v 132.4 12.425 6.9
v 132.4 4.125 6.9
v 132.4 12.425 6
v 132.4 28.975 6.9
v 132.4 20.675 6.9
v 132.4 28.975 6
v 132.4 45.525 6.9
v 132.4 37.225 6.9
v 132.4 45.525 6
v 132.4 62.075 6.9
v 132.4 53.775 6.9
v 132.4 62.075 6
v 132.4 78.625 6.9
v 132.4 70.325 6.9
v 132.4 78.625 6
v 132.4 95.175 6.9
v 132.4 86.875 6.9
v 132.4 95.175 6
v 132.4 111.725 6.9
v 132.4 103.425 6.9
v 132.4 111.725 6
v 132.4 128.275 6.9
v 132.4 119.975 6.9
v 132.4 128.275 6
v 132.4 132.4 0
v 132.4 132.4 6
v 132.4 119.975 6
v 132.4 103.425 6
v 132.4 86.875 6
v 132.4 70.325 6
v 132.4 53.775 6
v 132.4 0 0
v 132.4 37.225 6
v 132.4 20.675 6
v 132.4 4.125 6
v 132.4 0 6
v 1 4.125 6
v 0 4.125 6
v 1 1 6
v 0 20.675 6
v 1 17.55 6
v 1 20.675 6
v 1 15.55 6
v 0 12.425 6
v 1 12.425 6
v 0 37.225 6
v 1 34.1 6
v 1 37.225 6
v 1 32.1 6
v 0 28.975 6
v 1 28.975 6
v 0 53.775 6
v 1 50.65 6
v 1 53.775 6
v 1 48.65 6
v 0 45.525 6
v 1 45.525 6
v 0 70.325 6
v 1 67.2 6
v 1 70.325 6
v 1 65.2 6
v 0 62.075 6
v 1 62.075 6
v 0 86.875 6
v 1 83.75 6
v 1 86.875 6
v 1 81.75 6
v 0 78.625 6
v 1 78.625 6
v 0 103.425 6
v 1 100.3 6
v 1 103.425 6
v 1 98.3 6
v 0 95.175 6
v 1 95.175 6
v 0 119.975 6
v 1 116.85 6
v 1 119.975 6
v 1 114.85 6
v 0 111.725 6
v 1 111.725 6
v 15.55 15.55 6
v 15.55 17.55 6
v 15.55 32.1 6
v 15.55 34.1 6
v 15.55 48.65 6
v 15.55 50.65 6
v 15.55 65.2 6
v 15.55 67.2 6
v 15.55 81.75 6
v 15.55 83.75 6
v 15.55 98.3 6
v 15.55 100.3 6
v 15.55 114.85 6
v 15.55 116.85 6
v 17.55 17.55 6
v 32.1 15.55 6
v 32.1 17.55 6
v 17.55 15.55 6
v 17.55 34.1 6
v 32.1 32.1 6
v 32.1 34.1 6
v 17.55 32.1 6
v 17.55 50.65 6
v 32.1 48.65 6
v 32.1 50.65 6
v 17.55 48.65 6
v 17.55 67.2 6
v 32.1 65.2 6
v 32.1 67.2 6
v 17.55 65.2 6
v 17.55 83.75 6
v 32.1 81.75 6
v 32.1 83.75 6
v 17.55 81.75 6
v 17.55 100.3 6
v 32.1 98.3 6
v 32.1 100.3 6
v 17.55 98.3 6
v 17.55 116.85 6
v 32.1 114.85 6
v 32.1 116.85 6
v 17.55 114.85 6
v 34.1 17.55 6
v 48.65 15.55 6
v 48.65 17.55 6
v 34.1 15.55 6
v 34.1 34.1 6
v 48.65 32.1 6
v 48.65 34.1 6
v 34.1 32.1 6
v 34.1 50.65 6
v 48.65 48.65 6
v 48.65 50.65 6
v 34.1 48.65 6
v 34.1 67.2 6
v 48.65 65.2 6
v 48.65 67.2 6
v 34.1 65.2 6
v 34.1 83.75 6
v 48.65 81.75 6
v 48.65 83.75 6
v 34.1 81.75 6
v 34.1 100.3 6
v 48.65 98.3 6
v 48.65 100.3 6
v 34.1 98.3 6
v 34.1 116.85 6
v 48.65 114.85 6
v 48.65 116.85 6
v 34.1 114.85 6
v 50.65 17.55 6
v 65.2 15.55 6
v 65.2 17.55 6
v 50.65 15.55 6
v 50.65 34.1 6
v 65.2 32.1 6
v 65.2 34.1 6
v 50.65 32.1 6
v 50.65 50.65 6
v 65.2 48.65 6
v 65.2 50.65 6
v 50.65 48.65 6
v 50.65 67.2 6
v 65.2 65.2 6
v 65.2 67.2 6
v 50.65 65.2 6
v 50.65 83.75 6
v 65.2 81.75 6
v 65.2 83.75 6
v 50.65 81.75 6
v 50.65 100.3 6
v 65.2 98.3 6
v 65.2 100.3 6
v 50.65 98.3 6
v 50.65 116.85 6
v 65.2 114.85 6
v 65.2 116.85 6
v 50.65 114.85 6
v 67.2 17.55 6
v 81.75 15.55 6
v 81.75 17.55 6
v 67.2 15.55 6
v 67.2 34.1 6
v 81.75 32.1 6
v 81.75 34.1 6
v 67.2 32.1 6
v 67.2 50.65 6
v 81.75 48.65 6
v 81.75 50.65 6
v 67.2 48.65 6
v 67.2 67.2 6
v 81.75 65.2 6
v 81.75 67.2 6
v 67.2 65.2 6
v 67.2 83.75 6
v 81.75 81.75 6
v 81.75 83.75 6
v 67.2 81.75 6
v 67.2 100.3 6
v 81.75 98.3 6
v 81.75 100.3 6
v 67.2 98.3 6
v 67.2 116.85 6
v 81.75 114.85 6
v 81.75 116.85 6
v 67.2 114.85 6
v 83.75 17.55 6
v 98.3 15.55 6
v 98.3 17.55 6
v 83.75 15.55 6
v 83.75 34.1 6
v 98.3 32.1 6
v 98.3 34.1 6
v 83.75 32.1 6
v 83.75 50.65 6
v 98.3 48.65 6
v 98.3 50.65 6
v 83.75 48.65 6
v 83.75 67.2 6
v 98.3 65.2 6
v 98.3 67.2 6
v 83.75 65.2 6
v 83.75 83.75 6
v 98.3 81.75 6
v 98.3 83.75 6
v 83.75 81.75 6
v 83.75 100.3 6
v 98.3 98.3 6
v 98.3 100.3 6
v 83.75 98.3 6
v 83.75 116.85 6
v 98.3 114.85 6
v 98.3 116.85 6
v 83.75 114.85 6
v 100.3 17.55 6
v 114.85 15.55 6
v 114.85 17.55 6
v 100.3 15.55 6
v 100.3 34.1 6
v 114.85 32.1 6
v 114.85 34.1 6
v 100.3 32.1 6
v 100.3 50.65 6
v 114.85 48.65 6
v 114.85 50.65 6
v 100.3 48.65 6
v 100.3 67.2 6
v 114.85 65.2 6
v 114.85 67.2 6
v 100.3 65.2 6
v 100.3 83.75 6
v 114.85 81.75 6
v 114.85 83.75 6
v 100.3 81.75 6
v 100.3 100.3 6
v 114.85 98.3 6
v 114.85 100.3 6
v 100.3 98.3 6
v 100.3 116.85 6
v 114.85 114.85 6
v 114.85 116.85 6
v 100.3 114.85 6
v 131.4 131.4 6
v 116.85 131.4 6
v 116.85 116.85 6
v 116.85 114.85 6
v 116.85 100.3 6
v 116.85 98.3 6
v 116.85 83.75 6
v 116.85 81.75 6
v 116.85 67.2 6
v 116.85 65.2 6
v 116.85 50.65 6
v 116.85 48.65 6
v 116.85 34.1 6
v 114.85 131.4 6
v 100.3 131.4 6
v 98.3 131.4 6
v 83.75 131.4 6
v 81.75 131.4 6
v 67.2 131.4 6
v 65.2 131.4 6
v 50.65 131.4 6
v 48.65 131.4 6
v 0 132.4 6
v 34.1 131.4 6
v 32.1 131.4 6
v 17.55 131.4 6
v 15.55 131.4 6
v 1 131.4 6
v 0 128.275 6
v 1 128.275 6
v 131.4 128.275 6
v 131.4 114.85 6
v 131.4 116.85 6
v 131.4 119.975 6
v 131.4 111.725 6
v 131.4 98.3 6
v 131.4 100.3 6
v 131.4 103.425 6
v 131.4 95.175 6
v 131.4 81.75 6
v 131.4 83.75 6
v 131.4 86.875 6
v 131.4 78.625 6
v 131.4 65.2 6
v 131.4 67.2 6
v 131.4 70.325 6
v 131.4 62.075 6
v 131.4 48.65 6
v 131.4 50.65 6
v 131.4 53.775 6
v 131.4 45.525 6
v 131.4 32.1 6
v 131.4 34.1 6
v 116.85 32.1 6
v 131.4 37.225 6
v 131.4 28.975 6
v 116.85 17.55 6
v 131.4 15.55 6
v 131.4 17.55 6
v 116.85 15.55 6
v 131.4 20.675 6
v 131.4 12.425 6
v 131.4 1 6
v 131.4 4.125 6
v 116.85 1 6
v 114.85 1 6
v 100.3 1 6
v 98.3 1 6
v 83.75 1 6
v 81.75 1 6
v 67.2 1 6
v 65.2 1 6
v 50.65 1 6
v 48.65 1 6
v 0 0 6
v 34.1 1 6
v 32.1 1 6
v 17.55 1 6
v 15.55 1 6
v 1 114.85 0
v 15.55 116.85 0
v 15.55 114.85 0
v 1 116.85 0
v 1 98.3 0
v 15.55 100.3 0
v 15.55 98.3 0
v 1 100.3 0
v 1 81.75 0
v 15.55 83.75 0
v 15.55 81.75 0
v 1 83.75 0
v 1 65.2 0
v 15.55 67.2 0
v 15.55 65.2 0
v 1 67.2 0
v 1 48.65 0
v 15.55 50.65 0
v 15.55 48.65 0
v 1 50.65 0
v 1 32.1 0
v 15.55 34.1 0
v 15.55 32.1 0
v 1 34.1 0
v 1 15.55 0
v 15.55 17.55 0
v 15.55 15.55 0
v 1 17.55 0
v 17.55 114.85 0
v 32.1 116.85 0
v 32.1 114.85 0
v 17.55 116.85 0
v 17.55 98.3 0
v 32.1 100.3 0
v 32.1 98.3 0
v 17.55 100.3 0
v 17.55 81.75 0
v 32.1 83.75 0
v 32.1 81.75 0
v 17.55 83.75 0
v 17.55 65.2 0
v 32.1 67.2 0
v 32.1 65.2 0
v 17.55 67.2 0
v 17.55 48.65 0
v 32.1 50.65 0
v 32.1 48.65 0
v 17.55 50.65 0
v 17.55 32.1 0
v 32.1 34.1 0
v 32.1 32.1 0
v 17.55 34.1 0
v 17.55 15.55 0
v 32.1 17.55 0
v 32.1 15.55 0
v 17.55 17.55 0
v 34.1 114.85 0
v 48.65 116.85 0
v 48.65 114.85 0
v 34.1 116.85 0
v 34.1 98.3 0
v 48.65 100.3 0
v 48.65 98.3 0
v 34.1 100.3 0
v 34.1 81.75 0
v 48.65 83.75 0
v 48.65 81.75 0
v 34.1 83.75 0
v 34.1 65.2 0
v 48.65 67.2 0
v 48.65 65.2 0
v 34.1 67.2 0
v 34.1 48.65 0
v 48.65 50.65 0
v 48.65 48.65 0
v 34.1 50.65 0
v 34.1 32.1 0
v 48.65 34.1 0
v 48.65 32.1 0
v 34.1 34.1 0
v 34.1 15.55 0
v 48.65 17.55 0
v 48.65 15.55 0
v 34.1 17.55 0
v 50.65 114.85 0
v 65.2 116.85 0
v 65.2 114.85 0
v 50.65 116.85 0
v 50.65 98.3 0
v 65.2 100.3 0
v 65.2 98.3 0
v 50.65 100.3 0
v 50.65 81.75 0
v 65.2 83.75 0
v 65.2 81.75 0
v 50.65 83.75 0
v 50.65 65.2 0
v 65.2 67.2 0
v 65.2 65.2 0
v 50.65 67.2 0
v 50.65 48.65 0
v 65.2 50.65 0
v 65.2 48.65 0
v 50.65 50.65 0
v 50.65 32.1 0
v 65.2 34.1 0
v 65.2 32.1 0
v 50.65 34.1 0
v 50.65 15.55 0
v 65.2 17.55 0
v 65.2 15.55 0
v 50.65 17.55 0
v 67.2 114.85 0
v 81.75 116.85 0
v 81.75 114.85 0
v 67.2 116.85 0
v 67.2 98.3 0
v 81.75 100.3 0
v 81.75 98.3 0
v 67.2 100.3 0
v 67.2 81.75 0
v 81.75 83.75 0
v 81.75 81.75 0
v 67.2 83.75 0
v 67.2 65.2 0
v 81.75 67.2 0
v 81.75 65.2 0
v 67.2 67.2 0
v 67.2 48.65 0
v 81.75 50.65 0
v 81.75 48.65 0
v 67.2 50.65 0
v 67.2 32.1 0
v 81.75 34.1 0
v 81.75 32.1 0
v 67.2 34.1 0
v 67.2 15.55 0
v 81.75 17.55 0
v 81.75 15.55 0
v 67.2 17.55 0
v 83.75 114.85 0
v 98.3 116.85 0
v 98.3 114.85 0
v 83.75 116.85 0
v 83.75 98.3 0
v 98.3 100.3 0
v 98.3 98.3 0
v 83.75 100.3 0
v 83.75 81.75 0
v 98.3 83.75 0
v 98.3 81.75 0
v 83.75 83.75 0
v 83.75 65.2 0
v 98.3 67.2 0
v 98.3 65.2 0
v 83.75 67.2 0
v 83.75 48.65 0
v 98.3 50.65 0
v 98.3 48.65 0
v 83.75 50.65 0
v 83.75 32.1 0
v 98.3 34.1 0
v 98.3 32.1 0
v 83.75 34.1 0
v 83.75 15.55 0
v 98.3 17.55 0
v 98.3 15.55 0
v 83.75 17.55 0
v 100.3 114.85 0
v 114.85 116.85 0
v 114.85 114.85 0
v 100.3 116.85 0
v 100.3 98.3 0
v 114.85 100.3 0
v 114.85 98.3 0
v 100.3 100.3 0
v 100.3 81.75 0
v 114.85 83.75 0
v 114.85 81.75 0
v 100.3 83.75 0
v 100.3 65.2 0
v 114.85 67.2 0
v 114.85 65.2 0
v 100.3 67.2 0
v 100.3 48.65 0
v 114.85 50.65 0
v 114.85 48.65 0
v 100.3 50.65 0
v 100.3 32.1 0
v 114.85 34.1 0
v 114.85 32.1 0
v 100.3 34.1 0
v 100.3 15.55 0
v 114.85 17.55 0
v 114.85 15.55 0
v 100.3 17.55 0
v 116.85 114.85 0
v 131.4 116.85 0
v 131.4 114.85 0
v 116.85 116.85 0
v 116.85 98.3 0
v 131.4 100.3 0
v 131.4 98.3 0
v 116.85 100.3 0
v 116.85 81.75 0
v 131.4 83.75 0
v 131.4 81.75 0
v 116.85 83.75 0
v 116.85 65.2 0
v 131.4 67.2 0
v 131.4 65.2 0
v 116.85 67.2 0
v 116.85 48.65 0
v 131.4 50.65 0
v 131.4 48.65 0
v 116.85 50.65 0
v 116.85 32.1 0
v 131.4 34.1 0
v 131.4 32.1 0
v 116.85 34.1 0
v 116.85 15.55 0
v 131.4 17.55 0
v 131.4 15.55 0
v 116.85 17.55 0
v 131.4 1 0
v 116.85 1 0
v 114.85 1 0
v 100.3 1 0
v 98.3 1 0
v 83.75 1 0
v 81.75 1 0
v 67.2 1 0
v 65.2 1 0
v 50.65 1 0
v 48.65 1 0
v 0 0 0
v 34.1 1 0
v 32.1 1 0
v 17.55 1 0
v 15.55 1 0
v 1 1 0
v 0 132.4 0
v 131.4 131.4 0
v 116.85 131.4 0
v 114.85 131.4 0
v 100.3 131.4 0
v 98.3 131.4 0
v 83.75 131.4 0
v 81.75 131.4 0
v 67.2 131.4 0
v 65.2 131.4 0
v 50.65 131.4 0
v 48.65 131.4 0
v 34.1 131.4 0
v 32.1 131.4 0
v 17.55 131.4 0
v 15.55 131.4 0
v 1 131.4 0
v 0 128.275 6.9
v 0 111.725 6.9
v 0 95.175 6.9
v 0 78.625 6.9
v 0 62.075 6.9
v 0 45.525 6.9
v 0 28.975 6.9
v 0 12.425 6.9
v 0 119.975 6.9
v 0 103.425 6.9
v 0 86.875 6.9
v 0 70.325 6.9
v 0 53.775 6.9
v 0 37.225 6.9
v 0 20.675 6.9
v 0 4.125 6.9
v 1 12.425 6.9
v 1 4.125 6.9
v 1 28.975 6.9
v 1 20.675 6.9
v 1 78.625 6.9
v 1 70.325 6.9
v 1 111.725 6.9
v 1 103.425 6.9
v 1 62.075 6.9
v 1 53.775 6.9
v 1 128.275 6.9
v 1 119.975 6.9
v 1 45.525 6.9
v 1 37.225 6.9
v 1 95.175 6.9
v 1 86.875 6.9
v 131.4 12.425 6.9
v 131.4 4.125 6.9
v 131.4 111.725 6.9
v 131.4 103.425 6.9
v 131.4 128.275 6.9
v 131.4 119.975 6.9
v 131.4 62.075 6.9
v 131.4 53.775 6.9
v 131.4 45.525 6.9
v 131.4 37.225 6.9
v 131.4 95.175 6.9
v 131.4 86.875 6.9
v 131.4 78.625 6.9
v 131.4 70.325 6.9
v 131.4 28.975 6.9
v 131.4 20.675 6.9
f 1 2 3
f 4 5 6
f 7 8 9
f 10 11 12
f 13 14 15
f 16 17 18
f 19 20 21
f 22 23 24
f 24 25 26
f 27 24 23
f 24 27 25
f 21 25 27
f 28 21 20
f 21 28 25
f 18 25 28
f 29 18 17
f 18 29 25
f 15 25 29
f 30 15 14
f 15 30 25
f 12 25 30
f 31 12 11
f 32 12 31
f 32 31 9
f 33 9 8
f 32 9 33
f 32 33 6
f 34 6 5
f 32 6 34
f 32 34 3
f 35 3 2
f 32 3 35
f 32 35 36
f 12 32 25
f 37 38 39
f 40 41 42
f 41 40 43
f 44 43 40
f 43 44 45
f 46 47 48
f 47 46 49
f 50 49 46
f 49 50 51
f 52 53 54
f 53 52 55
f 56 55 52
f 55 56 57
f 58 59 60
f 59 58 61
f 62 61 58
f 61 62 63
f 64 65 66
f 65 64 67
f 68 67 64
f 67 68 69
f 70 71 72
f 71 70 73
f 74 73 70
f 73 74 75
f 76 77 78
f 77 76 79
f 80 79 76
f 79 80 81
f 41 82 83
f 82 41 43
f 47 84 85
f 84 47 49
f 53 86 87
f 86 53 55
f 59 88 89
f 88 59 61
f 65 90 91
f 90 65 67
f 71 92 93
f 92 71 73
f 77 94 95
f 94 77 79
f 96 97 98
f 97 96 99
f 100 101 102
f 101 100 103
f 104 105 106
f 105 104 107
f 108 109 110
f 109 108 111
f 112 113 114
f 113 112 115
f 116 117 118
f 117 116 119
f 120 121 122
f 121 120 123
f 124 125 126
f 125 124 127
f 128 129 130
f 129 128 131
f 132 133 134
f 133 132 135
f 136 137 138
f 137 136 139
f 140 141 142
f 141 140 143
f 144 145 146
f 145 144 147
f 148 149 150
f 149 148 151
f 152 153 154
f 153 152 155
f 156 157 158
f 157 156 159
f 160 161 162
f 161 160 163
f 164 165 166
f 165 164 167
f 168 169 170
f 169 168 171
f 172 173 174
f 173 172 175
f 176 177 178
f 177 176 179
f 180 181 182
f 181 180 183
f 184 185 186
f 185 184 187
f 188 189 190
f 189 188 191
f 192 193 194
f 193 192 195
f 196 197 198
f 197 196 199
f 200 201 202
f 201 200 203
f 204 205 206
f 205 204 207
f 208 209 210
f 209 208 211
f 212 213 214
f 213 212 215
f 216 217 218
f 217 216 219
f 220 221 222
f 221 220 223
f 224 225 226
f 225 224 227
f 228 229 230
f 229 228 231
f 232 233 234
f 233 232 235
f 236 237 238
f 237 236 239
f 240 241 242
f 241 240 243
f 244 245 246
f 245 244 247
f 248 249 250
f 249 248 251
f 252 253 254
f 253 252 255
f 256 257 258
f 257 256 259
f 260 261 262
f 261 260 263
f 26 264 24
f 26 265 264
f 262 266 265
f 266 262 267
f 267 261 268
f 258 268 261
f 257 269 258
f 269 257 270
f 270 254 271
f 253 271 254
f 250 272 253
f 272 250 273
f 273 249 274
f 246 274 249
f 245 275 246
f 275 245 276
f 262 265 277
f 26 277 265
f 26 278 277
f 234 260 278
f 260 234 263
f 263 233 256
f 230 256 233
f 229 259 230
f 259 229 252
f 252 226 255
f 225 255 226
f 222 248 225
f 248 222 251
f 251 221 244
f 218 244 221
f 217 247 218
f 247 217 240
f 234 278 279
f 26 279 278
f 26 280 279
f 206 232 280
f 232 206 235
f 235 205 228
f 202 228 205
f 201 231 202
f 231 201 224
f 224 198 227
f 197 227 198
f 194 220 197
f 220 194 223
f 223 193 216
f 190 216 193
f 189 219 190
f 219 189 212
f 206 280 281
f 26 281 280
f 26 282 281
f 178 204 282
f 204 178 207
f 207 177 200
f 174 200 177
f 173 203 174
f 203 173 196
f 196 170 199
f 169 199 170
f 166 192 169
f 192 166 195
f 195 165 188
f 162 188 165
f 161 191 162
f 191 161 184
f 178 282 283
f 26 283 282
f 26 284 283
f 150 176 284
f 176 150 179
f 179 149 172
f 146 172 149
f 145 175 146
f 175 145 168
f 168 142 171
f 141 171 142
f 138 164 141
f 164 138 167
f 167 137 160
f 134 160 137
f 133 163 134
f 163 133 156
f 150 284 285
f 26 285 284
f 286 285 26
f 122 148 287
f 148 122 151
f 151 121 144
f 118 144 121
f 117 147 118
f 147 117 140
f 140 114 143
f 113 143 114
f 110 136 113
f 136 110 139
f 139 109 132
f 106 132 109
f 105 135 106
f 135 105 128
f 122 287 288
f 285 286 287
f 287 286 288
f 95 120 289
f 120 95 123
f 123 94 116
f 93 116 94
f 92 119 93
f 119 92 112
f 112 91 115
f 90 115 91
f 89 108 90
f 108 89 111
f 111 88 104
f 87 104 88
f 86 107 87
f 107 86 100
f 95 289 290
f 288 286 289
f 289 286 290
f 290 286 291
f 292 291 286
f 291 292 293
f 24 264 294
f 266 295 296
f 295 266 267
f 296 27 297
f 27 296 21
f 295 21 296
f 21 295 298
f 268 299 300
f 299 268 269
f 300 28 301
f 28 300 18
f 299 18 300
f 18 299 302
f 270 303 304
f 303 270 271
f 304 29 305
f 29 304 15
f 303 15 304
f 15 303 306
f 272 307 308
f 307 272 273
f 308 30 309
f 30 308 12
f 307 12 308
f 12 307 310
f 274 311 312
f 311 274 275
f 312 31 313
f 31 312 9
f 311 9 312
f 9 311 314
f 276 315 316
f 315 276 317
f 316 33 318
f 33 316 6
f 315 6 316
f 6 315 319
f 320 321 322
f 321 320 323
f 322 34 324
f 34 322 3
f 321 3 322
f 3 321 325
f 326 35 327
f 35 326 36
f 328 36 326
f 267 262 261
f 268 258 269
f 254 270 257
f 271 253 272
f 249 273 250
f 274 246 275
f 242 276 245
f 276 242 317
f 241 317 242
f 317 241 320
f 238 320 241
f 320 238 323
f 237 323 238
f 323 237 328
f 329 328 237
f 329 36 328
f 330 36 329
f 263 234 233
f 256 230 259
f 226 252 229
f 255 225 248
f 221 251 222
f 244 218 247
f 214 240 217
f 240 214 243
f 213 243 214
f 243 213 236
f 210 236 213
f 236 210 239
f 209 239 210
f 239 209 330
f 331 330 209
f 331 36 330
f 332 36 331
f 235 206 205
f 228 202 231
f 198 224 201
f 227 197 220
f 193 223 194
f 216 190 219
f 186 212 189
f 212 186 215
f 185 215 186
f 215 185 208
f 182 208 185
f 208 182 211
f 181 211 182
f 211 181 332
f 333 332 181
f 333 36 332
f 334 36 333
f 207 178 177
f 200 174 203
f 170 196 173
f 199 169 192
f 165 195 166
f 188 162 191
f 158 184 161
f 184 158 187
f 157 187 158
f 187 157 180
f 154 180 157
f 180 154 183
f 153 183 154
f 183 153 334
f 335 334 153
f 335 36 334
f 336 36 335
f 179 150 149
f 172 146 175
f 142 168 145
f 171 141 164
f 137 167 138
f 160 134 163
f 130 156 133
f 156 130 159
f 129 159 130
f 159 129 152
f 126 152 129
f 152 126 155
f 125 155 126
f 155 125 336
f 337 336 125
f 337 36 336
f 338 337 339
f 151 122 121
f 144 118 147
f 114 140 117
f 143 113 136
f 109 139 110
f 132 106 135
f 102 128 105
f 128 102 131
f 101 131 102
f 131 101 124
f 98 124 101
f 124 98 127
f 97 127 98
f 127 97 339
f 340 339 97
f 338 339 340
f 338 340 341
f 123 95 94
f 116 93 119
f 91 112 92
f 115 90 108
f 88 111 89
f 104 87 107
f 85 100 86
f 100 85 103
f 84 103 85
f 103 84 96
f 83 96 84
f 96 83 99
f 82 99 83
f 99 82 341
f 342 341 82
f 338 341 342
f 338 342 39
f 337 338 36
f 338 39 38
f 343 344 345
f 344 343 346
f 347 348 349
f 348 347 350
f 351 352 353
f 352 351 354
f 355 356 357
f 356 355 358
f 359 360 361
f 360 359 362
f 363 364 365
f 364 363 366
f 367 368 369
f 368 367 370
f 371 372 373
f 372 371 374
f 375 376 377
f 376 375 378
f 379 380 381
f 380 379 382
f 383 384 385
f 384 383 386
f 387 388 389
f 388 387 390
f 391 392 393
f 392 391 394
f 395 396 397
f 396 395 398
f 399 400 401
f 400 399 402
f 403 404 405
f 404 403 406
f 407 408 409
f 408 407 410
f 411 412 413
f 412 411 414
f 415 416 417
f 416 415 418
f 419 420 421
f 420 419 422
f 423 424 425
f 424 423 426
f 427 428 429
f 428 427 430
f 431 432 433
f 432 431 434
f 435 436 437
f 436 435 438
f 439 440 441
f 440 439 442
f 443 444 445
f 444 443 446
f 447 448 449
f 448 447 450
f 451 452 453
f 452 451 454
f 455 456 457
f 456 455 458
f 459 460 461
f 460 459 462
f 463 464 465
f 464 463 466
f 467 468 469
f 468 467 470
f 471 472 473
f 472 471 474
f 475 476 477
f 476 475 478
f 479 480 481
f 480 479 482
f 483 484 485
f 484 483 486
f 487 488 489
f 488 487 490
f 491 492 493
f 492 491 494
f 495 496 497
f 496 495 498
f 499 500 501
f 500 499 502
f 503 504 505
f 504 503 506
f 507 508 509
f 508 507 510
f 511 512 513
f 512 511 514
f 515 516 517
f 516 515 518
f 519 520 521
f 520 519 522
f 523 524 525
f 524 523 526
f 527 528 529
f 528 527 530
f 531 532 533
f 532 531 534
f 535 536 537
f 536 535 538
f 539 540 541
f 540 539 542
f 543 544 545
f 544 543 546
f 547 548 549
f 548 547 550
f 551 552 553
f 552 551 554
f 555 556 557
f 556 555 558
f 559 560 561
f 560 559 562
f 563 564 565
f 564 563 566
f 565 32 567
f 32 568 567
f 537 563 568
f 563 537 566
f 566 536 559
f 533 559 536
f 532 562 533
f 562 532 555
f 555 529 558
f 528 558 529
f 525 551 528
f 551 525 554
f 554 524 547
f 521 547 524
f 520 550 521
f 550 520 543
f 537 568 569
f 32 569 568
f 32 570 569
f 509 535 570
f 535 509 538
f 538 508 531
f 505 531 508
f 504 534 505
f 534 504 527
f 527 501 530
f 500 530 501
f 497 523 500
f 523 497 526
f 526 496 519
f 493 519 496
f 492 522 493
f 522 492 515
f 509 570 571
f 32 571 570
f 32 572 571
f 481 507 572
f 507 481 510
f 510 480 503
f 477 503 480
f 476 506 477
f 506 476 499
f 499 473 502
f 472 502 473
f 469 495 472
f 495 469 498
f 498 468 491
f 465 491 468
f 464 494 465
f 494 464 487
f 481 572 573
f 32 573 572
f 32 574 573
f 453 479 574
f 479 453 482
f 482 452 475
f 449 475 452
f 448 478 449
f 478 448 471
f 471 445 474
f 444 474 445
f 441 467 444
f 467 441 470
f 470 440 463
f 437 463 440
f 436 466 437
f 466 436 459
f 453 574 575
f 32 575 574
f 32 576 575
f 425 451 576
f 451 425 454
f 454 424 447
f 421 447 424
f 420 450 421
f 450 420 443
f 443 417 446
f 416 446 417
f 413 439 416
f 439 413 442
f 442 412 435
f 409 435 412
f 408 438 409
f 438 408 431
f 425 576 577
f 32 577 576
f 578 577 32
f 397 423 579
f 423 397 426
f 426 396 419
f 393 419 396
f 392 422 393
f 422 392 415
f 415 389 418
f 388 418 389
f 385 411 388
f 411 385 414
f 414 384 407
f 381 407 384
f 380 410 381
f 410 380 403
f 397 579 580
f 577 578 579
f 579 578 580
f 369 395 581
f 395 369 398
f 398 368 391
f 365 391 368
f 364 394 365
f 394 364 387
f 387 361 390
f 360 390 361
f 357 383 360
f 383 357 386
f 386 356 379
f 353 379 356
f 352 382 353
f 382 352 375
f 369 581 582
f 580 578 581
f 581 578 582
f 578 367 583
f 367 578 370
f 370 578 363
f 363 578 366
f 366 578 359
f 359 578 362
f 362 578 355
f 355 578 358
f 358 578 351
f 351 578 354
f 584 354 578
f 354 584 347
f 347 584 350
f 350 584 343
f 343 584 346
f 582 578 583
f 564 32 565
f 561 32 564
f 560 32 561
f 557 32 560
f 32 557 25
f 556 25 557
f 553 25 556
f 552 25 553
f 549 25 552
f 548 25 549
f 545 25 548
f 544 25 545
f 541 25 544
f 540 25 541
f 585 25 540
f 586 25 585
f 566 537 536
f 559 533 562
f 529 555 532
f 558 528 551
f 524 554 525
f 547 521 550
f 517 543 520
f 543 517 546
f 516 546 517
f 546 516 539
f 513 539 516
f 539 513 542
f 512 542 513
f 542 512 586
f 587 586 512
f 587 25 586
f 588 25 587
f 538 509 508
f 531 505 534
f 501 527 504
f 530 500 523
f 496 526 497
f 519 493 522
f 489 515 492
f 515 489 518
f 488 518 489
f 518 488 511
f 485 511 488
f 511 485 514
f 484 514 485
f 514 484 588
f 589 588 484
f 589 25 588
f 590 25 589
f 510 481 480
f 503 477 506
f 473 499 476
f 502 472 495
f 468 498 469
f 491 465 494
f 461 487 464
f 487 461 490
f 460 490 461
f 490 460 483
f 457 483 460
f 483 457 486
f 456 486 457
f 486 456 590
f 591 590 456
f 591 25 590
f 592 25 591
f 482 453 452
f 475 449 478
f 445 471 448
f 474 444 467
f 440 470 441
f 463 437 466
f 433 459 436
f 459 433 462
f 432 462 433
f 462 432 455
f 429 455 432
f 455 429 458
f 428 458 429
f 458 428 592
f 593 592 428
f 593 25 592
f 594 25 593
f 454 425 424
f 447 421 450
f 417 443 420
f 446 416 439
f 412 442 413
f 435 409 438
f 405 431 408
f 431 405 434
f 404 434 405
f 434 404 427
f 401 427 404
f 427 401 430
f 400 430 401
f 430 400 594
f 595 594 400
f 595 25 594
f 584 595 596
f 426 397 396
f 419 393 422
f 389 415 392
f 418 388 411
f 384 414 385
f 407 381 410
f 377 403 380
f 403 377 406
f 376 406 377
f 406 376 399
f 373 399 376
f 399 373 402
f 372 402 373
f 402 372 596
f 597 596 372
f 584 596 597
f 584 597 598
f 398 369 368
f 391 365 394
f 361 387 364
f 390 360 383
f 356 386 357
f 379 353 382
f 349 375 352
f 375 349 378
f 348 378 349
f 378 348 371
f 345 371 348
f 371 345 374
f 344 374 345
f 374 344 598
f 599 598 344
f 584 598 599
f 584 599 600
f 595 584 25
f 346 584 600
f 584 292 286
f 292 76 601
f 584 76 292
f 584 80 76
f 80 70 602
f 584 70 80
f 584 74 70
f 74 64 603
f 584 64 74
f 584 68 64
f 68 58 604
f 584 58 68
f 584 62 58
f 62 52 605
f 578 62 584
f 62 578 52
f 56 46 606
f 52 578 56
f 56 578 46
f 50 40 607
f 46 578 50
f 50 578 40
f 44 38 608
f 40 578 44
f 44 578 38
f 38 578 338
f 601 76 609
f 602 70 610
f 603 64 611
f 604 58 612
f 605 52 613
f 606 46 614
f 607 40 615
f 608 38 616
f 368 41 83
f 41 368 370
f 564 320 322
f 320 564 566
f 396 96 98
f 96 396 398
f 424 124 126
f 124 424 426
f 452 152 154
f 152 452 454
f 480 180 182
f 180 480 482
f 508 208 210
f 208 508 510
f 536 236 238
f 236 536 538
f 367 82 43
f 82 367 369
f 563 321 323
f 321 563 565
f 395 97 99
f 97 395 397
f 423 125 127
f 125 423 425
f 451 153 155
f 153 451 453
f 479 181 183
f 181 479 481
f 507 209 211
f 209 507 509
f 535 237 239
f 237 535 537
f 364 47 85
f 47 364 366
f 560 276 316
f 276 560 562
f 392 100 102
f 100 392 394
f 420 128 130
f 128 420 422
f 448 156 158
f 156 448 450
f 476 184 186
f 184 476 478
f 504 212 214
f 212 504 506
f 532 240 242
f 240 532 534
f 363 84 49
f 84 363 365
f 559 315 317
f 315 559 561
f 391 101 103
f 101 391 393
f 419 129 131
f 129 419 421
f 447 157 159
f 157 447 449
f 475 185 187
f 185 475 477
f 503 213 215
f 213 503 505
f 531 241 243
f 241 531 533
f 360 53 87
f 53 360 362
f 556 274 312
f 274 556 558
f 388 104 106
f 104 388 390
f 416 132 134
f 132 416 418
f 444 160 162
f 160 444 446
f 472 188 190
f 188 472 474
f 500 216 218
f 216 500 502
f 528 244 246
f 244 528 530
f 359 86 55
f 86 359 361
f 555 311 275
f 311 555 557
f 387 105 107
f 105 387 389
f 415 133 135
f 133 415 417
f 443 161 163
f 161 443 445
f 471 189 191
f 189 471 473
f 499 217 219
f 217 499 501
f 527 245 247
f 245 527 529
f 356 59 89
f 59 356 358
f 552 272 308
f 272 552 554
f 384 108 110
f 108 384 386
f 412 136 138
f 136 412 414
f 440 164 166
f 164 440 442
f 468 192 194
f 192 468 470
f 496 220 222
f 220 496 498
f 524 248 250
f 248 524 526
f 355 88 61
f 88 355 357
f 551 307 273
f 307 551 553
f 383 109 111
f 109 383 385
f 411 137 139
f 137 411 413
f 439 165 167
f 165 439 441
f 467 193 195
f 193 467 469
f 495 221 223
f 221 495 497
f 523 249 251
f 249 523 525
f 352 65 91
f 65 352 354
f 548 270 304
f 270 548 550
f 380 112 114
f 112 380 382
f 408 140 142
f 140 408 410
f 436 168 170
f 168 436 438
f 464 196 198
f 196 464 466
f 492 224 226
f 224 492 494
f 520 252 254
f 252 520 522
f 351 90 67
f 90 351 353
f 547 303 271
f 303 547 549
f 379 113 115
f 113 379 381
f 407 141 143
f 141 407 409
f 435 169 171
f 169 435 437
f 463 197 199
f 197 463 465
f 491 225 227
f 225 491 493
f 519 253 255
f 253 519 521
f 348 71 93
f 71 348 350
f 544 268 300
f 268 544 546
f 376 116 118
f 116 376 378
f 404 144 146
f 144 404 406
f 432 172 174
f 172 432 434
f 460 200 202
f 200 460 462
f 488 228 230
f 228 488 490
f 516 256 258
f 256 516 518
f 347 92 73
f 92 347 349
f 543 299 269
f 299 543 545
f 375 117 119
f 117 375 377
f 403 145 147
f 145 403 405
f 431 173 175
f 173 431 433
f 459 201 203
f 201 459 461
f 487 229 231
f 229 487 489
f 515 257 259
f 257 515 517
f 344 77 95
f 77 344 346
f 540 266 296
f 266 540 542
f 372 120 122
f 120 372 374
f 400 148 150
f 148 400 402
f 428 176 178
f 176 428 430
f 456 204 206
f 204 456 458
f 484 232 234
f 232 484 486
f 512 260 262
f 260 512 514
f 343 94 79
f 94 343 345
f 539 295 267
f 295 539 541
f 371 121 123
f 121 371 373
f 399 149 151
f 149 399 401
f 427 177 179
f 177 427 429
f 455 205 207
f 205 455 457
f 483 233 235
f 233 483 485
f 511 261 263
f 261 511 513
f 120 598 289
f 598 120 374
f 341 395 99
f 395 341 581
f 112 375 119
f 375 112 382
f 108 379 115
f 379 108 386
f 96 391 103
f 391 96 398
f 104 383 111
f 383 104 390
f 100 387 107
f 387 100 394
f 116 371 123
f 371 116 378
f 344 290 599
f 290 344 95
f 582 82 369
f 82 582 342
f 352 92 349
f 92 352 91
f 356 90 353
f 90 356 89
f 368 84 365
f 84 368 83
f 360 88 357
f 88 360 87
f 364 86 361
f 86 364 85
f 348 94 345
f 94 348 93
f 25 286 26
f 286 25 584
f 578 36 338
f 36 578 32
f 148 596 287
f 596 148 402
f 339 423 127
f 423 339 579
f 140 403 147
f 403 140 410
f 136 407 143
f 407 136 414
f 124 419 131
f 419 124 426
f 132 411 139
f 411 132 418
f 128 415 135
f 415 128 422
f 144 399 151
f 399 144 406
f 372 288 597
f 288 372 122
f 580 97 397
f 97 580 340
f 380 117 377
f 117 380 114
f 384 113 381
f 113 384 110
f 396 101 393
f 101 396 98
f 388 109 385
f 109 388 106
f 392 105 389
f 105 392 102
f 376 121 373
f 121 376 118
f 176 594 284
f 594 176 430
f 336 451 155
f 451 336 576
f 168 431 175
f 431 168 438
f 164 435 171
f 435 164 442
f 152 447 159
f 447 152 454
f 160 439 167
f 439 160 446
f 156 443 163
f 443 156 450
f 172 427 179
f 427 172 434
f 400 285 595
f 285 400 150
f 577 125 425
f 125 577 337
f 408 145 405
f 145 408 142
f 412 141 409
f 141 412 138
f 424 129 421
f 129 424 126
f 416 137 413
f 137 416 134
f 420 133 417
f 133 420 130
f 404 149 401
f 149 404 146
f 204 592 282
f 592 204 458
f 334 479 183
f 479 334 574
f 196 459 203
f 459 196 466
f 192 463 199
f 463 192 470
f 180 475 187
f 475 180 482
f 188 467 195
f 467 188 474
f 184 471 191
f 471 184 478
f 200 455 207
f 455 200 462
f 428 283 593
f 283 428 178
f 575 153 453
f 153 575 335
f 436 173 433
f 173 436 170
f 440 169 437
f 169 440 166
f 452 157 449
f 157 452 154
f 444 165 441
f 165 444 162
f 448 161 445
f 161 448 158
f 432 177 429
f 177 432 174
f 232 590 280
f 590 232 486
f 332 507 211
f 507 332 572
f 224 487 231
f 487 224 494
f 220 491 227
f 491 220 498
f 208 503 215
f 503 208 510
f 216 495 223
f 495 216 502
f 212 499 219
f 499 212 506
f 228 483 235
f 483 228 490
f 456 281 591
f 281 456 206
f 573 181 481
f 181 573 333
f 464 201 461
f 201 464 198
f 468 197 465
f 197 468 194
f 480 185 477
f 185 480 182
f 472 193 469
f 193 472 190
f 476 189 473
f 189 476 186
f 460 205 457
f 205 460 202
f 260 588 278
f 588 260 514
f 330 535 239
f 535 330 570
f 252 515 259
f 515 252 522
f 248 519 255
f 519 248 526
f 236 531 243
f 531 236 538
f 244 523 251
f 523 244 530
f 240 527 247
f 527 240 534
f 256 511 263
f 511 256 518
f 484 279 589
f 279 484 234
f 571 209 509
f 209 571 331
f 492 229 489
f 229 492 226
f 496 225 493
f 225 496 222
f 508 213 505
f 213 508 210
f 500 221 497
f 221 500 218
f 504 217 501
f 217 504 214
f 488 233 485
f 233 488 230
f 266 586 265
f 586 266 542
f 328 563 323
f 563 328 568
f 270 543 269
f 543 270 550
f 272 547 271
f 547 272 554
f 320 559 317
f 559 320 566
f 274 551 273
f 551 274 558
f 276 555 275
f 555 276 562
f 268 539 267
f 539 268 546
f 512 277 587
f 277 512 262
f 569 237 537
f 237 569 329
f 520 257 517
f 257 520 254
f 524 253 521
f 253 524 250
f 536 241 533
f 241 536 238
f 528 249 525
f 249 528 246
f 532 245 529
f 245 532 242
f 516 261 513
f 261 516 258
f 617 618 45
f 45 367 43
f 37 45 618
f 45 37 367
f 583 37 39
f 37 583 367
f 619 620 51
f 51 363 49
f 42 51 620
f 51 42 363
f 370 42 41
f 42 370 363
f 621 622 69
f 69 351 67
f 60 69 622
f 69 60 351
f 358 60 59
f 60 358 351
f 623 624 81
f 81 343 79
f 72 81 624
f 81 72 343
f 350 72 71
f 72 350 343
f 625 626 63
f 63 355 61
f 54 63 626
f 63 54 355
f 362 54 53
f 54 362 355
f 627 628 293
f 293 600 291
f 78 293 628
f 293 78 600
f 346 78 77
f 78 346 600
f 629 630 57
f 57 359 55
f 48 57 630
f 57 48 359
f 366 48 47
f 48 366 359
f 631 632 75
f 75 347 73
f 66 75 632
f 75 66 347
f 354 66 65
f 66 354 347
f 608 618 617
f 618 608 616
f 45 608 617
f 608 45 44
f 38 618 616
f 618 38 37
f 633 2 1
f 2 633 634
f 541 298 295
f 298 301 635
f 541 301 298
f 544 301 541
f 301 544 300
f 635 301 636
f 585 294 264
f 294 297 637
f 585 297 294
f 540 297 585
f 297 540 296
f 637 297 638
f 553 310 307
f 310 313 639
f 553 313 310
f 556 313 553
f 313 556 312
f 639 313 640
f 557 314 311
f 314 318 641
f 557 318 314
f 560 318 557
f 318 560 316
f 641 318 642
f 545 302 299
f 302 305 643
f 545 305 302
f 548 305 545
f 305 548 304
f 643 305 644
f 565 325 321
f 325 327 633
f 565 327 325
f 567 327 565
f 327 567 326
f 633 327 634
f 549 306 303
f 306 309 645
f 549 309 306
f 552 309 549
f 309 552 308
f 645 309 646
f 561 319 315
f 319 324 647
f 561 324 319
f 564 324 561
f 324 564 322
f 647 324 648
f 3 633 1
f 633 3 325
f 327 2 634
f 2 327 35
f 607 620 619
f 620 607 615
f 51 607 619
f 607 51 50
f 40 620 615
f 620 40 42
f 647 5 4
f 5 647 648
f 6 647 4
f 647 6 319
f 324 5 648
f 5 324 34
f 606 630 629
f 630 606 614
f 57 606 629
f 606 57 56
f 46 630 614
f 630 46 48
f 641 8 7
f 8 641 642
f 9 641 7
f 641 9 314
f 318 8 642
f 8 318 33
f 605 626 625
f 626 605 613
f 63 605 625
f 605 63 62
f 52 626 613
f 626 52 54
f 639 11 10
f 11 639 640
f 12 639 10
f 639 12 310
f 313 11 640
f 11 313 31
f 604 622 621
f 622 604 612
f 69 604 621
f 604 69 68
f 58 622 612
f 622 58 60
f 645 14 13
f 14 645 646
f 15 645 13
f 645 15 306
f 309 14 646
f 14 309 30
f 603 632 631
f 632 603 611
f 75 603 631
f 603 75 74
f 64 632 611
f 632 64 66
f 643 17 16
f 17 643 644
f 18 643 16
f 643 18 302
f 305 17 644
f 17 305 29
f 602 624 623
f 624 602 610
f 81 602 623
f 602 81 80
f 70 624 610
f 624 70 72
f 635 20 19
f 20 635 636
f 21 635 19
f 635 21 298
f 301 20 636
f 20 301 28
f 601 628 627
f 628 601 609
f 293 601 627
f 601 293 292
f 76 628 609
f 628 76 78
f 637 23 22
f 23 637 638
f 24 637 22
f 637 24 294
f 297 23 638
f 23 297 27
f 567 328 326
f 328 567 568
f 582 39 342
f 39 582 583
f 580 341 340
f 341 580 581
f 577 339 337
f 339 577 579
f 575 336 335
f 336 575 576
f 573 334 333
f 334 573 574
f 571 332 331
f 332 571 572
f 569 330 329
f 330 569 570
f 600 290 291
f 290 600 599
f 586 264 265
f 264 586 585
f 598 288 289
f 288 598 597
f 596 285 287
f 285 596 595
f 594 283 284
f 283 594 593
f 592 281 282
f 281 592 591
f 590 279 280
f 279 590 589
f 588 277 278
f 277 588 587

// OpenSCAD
// file: ../config.scad
// General
countX = 8;
countY = 8;

// Based on the LED strips you want to use
ledSize = 4.85;
ledSpacing = 11.7;
ledStripWidth = 10.3;
cellSize = ledSize + ledSpacing;

// Top plate
pixelSpacing = 1.90; 
pixelSize = cellSize - pixelSpacing; 
pixelHeight = 1.00; 
plateHeight = 1.80; 

// Back plate
backPlateHeight = 3.0;
backPlateCutoutWidth = 4.0;
backPlateCutoutDepth = 1.0;
backPlateWiringHole = 3.4;

// Spacer
spacerHeight = 6.0;
spacerWall = 2.0;
spacerKeyHeight = backPlateCutoutDepth - 0.1;
spacerKeyWidth = ledStripWidth - 2;

// Electronics compartment
compartmentHeight = 15.0;
compartmentWall = spacerWall;
compartmentBaseHeight = 2.0;
compartmentHoles = [
  // width, height
  [10, 11], // Bottom
  [0, 0], // Left
  [0, 0], // Right
  [0, 0], // Top
];
// main file
include <../config.scad>;

spacerOpeningSize = cellSize - spacerWall;

totalWidth = countX * cellSize;
totalDepth = countY * cellSize;

// Inner horizontal walls
for (y = [1:countY-1]) {
    translate([0, y * cellSize - spacerWall/2, 0])
        cube([totalWidth, spacerWall, spacerHeight]);
}

// Inner vertical walls
for (x = [1:countX-1]) {
    translate([x * cellSize - spacerWall/2, 0, 0])
        cube([spacerWall, totalDepth, spacerHeight]);
}

// Edge walls
cube([spacerWall/2, totalDepth, spacerHeight]);
translate([totalWidth - spacerWall/2, 0, 0])
    cube([spacerWall/2, totalDepth, spacerHeight]);

cube([totalWidth, spacerWall/2, spacerHeight]);
translate([0, totalDepth - spacerWall/2, 0])
    cube([totalWidth, spacerWall/2, spacerHeight]);

// Keys on edge walls that align with back plate cutouts
for (y = [0:countY-1]) {
    // Left edge wall
    translate([0,
               y * cellSize + (cellSize - spacerKeyWidth) / 2,
               spacerHeight])
        cube([spacerWall/2, spacerKeyWidth, spacerKeyHeight]);

    // Right edge wall
    translate([totalWidth - spacerWall/2,
               y * cellSize + (cellSize - spacerKeyWidth) / 2,
               spacerHeight])
        cube([spacerWall/2, spacerKeyWidth, spacerKeyHeight]);
}
